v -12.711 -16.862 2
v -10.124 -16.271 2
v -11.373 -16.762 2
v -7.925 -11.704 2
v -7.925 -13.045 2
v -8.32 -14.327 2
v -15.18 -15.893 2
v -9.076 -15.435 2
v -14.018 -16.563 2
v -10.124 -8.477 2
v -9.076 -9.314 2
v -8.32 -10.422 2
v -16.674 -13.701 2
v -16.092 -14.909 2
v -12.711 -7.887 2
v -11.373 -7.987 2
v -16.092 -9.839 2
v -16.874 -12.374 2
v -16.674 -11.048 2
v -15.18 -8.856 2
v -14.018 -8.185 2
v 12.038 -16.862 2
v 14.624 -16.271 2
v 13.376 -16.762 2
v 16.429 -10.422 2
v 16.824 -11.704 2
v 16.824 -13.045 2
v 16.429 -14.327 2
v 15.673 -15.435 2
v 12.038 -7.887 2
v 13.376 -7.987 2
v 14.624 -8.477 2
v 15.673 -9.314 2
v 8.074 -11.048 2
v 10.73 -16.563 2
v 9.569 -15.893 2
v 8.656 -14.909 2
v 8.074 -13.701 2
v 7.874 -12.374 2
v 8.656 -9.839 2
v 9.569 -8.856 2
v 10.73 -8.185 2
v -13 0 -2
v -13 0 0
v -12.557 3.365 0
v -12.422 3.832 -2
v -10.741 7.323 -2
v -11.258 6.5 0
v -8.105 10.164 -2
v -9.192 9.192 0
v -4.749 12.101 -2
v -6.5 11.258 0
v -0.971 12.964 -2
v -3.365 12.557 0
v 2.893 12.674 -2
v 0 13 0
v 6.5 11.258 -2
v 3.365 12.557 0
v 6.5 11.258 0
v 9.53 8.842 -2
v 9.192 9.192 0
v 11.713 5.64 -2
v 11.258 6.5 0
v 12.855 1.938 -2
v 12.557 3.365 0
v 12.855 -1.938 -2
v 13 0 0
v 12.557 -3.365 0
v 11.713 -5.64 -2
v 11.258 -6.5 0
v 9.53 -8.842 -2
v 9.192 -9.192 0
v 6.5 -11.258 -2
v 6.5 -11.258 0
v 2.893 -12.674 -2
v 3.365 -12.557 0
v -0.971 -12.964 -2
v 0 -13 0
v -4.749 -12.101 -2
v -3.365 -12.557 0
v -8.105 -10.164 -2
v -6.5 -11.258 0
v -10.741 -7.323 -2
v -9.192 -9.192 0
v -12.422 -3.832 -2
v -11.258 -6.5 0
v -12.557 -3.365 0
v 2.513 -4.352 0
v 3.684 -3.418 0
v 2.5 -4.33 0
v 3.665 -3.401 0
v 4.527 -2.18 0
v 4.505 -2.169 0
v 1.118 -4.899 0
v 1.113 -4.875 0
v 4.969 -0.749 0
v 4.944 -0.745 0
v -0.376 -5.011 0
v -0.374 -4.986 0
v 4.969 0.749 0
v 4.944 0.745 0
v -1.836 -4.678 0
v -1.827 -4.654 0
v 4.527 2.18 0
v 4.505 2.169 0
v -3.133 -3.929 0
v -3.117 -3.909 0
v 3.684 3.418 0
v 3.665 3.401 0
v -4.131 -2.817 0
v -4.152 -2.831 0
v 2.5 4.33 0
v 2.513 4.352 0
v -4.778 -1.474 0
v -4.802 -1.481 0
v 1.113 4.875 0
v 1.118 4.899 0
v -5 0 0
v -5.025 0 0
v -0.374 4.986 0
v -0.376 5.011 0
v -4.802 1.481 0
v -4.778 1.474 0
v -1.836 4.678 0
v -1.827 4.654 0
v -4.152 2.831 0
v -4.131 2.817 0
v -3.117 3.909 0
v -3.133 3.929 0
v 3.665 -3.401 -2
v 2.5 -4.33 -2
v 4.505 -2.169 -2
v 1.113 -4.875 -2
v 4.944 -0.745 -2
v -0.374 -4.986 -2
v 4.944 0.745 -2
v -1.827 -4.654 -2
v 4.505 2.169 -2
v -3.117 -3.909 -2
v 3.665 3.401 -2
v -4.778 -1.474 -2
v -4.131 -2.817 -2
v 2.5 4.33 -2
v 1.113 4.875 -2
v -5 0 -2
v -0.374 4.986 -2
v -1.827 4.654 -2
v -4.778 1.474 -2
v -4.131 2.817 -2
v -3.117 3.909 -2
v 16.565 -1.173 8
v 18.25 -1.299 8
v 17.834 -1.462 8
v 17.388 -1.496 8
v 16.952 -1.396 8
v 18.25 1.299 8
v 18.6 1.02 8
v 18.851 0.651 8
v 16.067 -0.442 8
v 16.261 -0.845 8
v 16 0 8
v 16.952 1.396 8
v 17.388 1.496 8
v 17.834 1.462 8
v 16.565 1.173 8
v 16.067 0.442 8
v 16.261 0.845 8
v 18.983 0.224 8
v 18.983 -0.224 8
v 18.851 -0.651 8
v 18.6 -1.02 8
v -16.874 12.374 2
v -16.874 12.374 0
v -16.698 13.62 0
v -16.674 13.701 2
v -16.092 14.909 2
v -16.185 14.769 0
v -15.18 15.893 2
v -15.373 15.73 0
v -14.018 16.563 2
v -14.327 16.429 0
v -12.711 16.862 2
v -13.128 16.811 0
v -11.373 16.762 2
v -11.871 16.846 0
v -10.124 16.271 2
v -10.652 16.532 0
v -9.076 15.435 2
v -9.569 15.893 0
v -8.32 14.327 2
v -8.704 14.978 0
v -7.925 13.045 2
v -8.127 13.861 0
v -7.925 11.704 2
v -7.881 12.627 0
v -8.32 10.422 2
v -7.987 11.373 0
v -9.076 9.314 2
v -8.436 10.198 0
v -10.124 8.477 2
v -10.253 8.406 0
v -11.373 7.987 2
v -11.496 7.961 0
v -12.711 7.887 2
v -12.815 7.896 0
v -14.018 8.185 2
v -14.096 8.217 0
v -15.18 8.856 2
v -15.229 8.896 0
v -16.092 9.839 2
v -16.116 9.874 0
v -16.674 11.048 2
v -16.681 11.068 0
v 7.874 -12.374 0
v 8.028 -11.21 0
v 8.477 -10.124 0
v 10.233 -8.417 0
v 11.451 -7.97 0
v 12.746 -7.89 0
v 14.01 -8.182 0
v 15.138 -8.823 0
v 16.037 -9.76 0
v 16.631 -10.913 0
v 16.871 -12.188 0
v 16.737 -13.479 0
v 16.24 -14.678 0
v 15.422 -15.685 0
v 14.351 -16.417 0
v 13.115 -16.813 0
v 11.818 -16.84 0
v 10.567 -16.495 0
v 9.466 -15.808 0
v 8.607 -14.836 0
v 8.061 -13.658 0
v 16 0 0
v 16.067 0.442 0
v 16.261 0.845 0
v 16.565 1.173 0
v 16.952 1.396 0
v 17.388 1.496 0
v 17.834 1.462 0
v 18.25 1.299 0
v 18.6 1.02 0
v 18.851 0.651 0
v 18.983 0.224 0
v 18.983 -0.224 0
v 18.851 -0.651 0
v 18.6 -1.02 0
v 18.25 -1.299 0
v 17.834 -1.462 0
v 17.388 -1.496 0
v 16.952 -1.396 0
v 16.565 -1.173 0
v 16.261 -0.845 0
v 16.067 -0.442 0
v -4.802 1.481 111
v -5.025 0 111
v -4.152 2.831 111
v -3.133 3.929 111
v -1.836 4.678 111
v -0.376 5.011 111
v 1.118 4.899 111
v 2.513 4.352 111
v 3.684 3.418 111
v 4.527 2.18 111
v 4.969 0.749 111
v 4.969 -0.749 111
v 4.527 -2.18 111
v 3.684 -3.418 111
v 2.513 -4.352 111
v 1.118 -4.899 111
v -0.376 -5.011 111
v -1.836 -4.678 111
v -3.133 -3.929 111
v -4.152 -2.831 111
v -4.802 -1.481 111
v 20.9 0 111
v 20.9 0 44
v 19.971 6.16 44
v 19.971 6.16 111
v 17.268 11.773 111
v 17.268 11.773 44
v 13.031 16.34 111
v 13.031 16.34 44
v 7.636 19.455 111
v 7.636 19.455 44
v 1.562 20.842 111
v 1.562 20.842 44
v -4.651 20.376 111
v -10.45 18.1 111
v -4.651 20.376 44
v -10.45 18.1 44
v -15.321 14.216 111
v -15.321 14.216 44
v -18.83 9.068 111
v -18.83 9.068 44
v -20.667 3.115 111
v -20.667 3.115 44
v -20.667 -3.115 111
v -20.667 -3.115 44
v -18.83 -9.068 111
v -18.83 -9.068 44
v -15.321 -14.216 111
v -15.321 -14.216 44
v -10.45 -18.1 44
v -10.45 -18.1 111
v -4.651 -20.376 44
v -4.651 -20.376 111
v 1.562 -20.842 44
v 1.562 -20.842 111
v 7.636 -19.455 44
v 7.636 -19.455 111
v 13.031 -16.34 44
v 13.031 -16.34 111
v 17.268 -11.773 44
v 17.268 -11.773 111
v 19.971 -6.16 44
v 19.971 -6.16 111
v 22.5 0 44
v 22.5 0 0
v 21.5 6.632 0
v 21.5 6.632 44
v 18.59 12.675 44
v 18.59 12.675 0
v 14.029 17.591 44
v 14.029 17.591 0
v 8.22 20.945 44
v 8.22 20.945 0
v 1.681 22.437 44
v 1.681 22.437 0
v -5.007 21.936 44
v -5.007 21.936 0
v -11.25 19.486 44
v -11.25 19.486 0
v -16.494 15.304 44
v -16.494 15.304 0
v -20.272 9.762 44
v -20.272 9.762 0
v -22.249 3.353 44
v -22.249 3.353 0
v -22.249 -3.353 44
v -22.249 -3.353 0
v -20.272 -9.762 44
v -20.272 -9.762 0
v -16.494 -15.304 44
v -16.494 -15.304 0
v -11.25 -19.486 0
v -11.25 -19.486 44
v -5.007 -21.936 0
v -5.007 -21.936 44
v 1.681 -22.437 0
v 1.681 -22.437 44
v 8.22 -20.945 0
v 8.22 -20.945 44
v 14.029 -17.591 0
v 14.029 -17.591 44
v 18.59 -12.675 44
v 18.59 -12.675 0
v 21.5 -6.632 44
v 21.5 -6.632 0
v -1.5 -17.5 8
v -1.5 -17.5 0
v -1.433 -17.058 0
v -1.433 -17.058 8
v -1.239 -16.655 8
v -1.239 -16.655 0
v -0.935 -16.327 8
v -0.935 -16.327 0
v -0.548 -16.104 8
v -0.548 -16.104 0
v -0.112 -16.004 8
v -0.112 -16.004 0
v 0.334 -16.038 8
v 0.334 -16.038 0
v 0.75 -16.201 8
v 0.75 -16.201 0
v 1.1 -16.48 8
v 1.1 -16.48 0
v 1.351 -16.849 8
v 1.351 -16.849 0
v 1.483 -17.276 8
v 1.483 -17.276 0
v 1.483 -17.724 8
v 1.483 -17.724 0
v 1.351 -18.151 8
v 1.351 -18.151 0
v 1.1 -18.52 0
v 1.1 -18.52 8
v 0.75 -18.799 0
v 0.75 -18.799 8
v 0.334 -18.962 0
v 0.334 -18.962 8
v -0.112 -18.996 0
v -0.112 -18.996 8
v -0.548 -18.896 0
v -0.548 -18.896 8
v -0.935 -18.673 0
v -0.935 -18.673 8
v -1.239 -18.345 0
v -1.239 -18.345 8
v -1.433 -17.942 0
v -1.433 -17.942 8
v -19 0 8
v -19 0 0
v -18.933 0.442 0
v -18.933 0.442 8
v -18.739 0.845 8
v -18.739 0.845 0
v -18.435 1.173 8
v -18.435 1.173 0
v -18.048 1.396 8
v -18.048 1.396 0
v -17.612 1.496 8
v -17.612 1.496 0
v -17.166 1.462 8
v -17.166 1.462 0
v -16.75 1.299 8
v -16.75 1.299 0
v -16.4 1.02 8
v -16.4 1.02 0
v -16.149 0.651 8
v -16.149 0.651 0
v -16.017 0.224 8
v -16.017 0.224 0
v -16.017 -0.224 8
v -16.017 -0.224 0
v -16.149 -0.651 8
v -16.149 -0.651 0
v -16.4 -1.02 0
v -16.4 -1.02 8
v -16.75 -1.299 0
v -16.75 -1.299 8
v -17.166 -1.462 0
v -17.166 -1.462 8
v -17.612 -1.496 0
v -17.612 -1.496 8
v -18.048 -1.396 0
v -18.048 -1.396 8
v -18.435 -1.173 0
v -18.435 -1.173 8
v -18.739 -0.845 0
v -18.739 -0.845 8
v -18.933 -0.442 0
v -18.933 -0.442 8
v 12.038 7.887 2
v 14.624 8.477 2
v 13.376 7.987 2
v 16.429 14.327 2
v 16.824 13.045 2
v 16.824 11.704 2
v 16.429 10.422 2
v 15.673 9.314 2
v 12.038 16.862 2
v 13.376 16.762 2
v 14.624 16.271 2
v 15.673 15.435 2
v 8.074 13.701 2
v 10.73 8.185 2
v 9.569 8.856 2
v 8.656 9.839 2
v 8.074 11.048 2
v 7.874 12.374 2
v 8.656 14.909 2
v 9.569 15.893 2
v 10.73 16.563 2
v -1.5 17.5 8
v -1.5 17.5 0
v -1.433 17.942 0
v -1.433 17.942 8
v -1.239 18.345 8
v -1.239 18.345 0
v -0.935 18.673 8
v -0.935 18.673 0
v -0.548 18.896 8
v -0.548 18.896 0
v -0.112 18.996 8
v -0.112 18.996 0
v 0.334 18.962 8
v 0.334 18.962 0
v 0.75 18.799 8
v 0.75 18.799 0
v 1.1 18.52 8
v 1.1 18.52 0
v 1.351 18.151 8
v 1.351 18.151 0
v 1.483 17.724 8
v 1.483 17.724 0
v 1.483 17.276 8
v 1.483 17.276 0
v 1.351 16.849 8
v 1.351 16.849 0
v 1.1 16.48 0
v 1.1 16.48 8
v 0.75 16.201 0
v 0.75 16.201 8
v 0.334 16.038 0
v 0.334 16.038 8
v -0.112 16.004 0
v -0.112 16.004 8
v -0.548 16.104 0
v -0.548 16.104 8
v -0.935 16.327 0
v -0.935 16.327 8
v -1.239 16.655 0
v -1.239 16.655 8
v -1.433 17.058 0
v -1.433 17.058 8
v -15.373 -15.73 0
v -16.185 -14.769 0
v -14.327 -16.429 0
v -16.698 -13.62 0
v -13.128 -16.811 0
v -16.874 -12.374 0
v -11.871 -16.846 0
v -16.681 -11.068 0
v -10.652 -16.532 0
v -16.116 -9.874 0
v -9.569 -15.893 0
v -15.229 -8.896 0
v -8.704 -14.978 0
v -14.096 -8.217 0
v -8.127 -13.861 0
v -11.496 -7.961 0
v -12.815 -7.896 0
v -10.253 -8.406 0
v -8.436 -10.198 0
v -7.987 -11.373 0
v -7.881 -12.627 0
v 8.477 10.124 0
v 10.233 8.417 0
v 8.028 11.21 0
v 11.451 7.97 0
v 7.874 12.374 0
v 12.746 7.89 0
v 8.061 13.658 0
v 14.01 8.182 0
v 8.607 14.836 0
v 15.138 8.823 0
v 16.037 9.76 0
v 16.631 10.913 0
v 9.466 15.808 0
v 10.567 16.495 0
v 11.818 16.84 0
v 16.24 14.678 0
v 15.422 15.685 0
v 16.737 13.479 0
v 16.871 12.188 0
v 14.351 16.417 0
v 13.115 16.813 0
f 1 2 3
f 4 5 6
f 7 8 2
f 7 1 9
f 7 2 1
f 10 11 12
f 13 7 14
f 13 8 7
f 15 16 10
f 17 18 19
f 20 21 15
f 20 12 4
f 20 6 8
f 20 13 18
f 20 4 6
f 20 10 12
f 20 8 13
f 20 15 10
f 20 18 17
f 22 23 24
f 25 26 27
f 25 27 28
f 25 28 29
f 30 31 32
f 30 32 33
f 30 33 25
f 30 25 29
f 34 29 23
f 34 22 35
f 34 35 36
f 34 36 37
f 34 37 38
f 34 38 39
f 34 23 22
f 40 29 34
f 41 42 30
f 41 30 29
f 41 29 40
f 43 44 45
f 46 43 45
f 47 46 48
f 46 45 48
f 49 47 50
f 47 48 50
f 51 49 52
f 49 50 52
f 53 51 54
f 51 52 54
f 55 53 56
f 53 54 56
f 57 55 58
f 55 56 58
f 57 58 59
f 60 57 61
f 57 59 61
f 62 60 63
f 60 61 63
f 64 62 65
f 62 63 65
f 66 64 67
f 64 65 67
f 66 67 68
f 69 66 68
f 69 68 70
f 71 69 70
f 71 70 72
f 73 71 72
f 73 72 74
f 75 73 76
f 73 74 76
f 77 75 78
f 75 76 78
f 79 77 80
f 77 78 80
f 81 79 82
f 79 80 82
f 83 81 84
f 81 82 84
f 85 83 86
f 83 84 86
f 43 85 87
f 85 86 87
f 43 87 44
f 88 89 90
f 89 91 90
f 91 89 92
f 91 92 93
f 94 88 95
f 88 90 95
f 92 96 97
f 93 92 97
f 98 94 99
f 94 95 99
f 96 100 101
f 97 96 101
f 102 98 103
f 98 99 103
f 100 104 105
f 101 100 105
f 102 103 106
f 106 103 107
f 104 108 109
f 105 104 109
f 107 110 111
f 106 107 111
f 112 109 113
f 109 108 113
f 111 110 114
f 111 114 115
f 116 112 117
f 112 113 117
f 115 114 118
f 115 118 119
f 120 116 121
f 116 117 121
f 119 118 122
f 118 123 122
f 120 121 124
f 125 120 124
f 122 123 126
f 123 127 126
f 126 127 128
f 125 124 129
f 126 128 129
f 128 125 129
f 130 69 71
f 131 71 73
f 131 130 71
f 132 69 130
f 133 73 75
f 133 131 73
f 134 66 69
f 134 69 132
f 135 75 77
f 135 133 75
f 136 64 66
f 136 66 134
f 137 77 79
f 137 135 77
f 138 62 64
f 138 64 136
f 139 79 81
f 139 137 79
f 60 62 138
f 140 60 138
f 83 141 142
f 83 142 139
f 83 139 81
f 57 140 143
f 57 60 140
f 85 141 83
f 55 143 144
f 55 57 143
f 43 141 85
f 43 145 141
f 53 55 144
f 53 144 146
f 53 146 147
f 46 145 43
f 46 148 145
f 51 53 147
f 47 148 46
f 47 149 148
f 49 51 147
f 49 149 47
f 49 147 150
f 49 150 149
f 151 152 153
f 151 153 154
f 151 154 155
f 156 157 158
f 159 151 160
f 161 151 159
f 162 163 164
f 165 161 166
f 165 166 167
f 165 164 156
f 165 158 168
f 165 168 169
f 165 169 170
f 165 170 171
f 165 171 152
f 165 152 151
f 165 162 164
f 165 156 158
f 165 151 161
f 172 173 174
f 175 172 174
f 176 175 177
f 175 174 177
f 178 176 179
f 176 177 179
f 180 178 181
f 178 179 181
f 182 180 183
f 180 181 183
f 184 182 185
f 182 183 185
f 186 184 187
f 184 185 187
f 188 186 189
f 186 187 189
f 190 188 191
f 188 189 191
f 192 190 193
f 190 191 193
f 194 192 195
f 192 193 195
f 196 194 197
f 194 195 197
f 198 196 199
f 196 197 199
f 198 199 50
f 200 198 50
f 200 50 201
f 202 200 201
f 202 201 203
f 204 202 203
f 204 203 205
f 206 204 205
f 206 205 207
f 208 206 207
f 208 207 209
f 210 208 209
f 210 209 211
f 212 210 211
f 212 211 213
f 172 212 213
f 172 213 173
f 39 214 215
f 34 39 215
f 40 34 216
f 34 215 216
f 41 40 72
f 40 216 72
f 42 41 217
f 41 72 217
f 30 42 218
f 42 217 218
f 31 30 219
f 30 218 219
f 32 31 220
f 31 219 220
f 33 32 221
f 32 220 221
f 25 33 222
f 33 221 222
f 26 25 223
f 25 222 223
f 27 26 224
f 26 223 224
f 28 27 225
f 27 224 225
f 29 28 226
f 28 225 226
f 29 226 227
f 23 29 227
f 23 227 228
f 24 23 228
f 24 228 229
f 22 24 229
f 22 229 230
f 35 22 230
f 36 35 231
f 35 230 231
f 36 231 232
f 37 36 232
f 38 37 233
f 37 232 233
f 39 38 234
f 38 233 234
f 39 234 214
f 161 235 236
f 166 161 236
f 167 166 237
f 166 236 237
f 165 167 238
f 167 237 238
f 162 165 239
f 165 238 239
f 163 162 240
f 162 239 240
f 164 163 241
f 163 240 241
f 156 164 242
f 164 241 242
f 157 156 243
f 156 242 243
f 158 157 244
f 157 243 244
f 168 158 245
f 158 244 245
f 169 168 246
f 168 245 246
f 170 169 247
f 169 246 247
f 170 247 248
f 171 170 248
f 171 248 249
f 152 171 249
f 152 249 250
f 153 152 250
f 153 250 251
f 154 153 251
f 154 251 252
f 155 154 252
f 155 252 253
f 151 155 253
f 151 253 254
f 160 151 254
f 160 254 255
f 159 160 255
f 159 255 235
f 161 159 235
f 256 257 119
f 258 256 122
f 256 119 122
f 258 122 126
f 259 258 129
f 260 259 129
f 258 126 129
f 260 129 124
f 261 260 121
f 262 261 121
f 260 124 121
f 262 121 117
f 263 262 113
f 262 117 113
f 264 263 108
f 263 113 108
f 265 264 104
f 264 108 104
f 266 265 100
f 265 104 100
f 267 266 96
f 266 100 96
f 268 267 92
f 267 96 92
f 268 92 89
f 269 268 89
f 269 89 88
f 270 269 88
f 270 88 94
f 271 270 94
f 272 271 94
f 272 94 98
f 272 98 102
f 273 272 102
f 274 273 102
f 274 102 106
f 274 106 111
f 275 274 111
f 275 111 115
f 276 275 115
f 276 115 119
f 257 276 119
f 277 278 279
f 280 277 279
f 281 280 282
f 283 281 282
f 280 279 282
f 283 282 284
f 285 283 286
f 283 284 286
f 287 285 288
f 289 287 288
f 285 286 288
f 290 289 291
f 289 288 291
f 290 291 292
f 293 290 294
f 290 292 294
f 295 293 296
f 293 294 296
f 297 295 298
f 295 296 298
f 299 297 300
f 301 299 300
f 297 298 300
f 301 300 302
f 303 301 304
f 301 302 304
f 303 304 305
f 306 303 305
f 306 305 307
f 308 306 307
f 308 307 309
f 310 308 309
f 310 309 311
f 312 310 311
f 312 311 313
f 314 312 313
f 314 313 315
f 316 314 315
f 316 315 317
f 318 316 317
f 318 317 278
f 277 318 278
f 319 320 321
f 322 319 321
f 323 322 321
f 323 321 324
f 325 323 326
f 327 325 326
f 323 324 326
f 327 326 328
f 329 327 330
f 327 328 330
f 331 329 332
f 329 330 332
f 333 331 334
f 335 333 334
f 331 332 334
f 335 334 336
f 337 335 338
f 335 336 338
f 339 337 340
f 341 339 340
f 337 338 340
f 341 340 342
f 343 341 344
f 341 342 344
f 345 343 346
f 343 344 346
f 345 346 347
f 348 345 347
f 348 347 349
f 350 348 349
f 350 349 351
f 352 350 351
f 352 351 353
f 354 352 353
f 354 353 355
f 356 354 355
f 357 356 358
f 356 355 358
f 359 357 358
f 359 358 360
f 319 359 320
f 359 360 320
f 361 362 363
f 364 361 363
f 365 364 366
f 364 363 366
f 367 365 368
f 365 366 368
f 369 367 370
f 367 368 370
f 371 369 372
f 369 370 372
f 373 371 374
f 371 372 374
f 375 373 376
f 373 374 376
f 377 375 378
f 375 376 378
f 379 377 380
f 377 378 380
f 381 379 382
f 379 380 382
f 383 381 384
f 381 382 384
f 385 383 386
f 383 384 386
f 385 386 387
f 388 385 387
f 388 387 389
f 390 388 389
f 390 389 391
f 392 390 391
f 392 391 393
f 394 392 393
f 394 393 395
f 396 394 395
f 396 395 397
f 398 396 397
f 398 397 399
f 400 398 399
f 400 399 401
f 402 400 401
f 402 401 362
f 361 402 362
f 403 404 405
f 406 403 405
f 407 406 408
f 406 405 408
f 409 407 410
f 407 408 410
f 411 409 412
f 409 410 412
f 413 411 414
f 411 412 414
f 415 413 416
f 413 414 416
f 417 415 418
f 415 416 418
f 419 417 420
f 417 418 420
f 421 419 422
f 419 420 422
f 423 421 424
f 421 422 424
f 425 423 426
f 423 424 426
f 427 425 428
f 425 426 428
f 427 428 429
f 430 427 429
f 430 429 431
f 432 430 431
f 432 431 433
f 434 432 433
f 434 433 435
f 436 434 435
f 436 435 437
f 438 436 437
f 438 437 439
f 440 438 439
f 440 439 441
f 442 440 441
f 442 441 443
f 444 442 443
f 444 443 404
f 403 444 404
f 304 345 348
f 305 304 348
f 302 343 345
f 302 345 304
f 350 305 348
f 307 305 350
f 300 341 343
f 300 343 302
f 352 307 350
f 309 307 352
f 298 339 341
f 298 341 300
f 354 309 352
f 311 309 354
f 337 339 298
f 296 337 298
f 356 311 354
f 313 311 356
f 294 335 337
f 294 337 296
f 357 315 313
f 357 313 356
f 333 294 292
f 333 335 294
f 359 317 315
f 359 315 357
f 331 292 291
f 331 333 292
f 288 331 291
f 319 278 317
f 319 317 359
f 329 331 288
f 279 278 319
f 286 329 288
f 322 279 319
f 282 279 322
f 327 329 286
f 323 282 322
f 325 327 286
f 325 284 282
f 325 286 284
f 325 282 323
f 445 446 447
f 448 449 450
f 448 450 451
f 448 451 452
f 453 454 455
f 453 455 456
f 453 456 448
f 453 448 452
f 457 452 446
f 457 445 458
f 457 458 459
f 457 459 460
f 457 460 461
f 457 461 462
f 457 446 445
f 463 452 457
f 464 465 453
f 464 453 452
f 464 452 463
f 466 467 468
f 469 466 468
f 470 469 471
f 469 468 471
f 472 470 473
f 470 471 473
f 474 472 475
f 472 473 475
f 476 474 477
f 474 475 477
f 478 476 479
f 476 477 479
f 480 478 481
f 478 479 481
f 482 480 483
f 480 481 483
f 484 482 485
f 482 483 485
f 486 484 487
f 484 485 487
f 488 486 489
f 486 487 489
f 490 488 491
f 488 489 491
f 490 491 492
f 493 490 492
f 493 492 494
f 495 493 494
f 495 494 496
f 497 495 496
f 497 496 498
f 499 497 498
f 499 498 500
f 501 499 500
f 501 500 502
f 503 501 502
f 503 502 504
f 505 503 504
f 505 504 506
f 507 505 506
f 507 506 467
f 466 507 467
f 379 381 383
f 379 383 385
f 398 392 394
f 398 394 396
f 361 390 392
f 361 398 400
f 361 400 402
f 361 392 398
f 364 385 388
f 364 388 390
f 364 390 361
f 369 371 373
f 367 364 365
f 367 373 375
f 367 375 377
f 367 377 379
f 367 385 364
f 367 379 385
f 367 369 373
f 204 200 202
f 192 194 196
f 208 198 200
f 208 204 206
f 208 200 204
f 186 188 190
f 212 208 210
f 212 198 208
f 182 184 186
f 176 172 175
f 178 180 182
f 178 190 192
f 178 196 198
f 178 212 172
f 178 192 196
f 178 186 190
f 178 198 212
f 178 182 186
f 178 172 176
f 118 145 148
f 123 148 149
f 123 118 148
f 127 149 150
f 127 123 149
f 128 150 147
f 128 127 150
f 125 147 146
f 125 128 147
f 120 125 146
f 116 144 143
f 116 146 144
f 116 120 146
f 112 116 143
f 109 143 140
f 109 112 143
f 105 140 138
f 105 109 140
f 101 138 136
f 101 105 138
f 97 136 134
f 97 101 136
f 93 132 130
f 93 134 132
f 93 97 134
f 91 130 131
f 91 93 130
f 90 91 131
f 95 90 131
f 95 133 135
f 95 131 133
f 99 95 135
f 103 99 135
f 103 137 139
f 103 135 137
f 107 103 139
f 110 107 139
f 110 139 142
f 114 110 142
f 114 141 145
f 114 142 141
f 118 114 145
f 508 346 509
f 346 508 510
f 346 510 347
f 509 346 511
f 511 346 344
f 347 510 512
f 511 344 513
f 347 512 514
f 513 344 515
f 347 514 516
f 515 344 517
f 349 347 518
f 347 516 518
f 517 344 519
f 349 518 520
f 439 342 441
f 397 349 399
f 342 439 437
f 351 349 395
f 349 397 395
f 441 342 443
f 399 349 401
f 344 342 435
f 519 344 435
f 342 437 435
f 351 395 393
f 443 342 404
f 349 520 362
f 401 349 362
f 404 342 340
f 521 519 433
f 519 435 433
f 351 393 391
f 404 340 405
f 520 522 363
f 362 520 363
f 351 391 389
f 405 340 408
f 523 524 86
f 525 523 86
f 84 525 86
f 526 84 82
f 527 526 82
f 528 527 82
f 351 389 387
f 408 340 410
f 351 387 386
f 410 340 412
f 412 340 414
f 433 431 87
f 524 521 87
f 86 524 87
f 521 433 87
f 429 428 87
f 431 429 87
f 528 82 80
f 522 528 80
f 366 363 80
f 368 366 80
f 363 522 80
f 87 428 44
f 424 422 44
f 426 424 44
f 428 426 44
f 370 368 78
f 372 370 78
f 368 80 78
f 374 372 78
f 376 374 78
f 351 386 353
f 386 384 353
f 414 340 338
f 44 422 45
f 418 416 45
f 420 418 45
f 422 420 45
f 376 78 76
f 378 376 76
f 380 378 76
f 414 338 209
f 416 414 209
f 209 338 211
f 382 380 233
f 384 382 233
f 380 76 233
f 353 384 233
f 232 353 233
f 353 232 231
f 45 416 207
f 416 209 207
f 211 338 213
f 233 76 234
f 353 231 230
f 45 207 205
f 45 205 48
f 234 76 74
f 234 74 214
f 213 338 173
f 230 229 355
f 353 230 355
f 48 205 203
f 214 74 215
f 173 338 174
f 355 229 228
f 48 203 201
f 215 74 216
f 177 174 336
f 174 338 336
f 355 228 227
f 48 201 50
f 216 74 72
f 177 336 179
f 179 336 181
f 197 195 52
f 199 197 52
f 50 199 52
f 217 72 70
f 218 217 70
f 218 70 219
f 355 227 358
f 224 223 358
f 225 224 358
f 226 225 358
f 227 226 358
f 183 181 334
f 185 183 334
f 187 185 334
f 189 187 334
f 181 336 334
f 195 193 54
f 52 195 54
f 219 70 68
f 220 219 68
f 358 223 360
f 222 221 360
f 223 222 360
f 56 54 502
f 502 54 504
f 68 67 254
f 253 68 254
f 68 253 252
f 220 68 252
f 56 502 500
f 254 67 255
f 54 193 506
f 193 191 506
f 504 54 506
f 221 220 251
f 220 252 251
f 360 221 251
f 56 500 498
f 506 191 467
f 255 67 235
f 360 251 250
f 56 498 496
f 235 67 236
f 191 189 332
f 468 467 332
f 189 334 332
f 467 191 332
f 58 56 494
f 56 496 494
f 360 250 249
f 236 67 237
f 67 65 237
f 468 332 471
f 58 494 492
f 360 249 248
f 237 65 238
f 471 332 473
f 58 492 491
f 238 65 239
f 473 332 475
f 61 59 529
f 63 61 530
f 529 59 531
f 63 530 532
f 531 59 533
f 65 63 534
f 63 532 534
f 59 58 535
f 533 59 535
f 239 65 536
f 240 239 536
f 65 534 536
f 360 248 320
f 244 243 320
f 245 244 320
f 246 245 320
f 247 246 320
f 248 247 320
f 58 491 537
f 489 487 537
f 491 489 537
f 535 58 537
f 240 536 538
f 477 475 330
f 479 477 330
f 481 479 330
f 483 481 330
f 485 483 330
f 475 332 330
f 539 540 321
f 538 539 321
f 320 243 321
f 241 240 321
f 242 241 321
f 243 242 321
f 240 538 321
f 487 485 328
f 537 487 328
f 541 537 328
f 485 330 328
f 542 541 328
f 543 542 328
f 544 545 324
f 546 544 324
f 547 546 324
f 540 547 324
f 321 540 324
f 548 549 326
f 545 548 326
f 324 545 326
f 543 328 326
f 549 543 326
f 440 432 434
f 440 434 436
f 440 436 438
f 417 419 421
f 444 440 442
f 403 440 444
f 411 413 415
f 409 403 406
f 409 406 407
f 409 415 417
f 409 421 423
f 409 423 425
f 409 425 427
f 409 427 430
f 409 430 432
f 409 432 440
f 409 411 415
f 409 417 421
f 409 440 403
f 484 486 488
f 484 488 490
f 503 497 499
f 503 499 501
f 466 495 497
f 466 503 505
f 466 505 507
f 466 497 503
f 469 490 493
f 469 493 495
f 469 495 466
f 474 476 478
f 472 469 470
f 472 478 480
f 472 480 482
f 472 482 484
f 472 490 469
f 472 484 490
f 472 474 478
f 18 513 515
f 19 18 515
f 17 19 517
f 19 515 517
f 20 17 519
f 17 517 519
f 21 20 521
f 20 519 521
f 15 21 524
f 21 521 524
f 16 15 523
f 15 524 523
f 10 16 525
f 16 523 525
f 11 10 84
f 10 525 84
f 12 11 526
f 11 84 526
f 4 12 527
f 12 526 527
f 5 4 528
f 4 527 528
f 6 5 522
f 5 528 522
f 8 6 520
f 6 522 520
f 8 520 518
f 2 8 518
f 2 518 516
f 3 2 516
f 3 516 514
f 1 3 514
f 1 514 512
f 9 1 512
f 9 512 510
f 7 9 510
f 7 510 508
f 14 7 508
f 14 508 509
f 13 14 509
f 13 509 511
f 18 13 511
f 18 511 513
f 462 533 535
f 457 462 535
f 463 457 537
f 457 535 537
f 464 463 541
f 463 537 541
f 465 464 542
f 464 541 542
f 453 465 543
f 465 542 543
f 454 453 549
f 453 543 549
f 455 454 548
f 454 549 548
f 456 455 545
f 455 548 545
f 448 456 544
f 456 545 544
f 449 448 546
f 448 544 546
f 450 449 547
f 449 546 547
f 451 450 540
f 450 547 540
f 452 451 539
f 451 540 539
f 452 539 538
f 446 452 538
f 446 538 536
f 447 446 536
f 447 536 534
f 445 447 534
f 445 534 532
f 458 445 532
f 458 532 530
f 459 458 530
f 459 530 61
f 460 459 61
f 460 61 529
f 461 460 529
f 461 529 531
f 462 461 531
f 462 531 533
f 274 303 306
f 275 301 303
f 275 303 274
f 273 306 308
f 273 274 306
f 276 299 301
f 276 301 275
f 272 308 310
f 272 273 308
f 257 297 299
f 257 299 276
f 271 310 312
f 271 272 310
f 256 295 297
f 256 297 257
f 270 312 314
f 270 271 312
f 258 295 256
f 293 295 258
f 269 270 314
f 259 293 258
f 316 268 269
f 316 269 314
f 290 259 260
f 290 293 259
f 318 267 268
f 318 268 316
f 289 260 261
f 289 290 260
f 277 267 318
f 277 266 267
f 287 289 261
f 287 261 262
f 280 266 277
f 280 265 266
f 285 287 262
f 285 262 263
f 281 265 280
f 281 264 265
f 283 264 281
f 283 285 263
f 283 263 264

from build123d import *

# Parameters (mm, degrees)
SKETCH1_R           = 22.5
SKETCH1_R_2         = 20.9
BOSS_EXTRUDE1_DEPTH = 44
SKETCH1_2_R         = 20.9
BOSS_EXTRUDE2_DEPTH = 111
SKETCH3_R           = 5.025
CUT_EXTRUDE1_DEPTH  = 171
SKETCH2_R           = 13
BOSS_EXTRUDE5_DEPTH = 2
SKETCH2_4_R         = 5
CUT_EXTRUDE2_DEPTH  = 35
SKETCH6_R           = 1.5
CUT_EXTRUDE4_DEPTH  = 10
SKETCH6_3_R         = 1.5
CUT_EXTRUDE5_DEPTH  = 10
SKETCH6_4_R         = 1.5
CUT_EXTRUDE6_DEPTH  = 10
SKETCH6_5_R         = 1.5
CUT_EXTRUDE7_DEPTH  = 10
SKETCH6_7_R         = 4.5
CUT_EXTRUDE8_DEPTH  = 4
SKETCH6_8_R         = 4.5
CUT_EXTRUDE9_DEPTH  = 4
SKETCH6_9_R         = 4.5
CUT_EXTRUDE10_DEPTH = 4
SKETCH6_10_R        = 4.5
CUT_EXTRUDE11_DEPTH = 4


with BuildPart() as part:
    # Sketch1 → Boss-Extrude1 (new body)
    with BuildSketch(Plane.XY):
        Circle(SKETCH1_R)
        Circle(SKETCH1_R_2, mode=Mode.SUBTRACT)
    extrude(amount=BOSS_EXTRUDE1_DEPTH)

    # Sketch1<2> → Boss-Extrude2 (add)
    with BuildSketch(Plane.XY):
        Circle(SKETCH1_2_R)
    extrude(amount=BOSS_EXTRUDE2_DEPTH)

    # Sketch3 → Cut-Extrude1 (cut)
    with BuildSketch(Plane(origin=(0, 0, 0), x_dir=(-1, 0, 0), z_dir=(0, 0, -1))):
        Circle(SKETCH3_R)
    extrude(amount=-CUT_EXTRUDE1_DEPTH, mode=Mode.SUBTRACT)

    # Sketch2 → Boss-Extrude5 (add)
    with BuildSketch(Plane(origin=(0, 0, 0), x_dir=(-1, 0, 0), z_dir=(0, 0, -1))):
        Circle(SKETCH2_R)
    extrude(amount=BOSS_EXTRUDE5_DEPTH)

    # Sketch2<4> → Cut-Extrude2 (cut)
    with BuildSketch(Plane(origin=(0, 0, 0), x_dir=(-1, 0, 0), z_dir=(0, 0, -1))):
        Circle(SKETCH2_4_R)
    extrude(amount=CUT_EXTRUDE2_DEPTH, mode=Mode.SUBTRACT)

    # Sketch6 → Cut-Extrude4 (cut)
    with BuildSketch(Plane(origin=(0, 0, -2), x_dir=(-1, 0, 0), z_dir=(0, 0, -1))):
        with Locations((0, 17.5)):
            Circle(SKETCH6_R)
    extrude(amount=-CUT_EXTRUDE4_DEPTH, mode=Mode.SUBTRACT)

    # Sketch6<3> → Cut-Extrude5 (cut)
    with BuildSketch(Plane(origin=(0, 0, -2), x_dir=(-1, 0, 0), z_dir=(0, 0, -1))):
        with Locations((17.5, 0)):
            Circle(SKETCH6_3_R)
    extrude(amount=-CUT_EXTRUDE5_DEPTH, mode=Mode.SUBTRACT)

    # Sketch6<4> → Cut-Extrude6 (cut)
    with BuildSketch(Plane(origin=(0, 0, -2), x_dir=(-1, 0, 0), z_dir=(0, 0, -1))):
        with Locations((0, -17.5)):
            Circle(SKETCH6_4_R)
    extrude(amount=-CUT_EXTRUDE6_DEPTH, mode=Mode.SUBTRACT)

    # Sketch6<5> → Cut-Extrude7 (cut)
    with BuildSketch(Plane(origin=(0, 0, -2), x_dir=(-1, 0, 0), z_dir=(0, 0, -1))):
        with Locations((-17.5, 0)):
            Circle(SKETCH6_5_R)
    extrude(amount=-CUT_EXTRUDE7_DEPTH, mode=Mode.SUBTRACT)

    # Sketch6<7> → Cut-Extrude8 (cut)
    with BuildSketch(Plane(origin=(0, 0, -2), x_dir=(-1, 0, 0), z_dir=(0, 0, -1))):
        with Locations((12.374368671, 12.374368671)):
            Circle(SKETCH6_7_R)
    extrude(amount=-CUT_EXTRUDE8_DEPTH, mode=Mode.SUBTRACT)

    # Sketch6<8> → Cut-Extrude9 (cut)
    with BuildSketch(Plane(origin=(0, 0, -2), x_dir=(-1, 0, 0), z_dir=(0, 0, -1))):
        with Locations((-12.374368671, 12.374368671)):
            Circle(SKETCH6_8_R)
    extrude(amount=-CUT_EXTRUDE9_DEPTH, mode=Mode.SUBTRACT)

    # Sketch6<9> → Cut-Extrude10 (cut)
    with BuildSketch(Plane(origin=(0, 0, -2), x_dir=(-1, 0, 0), z_dir=(0, 0, -1))):
        with Locations((-12.374368671, -12.374368671)):
            Circle(SKETCH6_9_R)
    extrude(amount=-CUT_EXTRUDE10_DEPTH, mode=Mode.SUBTRACT)

    # Sketch6<10> → Cut-Extrude11 (cut)
    with BuildSketch(Plane(origin=(0, 0, -2), x_dir=(-1, 0, 0), z_dir=(0, 0, -1))):
        with Locations((12.374368671, -12.374368671)):
            Circle(SKETCH6_10_R)
    extrude(amount=-CUT_EXTRUDE11_DEPTH, mode=Mode.SUBTRACT)


solid = part.part
